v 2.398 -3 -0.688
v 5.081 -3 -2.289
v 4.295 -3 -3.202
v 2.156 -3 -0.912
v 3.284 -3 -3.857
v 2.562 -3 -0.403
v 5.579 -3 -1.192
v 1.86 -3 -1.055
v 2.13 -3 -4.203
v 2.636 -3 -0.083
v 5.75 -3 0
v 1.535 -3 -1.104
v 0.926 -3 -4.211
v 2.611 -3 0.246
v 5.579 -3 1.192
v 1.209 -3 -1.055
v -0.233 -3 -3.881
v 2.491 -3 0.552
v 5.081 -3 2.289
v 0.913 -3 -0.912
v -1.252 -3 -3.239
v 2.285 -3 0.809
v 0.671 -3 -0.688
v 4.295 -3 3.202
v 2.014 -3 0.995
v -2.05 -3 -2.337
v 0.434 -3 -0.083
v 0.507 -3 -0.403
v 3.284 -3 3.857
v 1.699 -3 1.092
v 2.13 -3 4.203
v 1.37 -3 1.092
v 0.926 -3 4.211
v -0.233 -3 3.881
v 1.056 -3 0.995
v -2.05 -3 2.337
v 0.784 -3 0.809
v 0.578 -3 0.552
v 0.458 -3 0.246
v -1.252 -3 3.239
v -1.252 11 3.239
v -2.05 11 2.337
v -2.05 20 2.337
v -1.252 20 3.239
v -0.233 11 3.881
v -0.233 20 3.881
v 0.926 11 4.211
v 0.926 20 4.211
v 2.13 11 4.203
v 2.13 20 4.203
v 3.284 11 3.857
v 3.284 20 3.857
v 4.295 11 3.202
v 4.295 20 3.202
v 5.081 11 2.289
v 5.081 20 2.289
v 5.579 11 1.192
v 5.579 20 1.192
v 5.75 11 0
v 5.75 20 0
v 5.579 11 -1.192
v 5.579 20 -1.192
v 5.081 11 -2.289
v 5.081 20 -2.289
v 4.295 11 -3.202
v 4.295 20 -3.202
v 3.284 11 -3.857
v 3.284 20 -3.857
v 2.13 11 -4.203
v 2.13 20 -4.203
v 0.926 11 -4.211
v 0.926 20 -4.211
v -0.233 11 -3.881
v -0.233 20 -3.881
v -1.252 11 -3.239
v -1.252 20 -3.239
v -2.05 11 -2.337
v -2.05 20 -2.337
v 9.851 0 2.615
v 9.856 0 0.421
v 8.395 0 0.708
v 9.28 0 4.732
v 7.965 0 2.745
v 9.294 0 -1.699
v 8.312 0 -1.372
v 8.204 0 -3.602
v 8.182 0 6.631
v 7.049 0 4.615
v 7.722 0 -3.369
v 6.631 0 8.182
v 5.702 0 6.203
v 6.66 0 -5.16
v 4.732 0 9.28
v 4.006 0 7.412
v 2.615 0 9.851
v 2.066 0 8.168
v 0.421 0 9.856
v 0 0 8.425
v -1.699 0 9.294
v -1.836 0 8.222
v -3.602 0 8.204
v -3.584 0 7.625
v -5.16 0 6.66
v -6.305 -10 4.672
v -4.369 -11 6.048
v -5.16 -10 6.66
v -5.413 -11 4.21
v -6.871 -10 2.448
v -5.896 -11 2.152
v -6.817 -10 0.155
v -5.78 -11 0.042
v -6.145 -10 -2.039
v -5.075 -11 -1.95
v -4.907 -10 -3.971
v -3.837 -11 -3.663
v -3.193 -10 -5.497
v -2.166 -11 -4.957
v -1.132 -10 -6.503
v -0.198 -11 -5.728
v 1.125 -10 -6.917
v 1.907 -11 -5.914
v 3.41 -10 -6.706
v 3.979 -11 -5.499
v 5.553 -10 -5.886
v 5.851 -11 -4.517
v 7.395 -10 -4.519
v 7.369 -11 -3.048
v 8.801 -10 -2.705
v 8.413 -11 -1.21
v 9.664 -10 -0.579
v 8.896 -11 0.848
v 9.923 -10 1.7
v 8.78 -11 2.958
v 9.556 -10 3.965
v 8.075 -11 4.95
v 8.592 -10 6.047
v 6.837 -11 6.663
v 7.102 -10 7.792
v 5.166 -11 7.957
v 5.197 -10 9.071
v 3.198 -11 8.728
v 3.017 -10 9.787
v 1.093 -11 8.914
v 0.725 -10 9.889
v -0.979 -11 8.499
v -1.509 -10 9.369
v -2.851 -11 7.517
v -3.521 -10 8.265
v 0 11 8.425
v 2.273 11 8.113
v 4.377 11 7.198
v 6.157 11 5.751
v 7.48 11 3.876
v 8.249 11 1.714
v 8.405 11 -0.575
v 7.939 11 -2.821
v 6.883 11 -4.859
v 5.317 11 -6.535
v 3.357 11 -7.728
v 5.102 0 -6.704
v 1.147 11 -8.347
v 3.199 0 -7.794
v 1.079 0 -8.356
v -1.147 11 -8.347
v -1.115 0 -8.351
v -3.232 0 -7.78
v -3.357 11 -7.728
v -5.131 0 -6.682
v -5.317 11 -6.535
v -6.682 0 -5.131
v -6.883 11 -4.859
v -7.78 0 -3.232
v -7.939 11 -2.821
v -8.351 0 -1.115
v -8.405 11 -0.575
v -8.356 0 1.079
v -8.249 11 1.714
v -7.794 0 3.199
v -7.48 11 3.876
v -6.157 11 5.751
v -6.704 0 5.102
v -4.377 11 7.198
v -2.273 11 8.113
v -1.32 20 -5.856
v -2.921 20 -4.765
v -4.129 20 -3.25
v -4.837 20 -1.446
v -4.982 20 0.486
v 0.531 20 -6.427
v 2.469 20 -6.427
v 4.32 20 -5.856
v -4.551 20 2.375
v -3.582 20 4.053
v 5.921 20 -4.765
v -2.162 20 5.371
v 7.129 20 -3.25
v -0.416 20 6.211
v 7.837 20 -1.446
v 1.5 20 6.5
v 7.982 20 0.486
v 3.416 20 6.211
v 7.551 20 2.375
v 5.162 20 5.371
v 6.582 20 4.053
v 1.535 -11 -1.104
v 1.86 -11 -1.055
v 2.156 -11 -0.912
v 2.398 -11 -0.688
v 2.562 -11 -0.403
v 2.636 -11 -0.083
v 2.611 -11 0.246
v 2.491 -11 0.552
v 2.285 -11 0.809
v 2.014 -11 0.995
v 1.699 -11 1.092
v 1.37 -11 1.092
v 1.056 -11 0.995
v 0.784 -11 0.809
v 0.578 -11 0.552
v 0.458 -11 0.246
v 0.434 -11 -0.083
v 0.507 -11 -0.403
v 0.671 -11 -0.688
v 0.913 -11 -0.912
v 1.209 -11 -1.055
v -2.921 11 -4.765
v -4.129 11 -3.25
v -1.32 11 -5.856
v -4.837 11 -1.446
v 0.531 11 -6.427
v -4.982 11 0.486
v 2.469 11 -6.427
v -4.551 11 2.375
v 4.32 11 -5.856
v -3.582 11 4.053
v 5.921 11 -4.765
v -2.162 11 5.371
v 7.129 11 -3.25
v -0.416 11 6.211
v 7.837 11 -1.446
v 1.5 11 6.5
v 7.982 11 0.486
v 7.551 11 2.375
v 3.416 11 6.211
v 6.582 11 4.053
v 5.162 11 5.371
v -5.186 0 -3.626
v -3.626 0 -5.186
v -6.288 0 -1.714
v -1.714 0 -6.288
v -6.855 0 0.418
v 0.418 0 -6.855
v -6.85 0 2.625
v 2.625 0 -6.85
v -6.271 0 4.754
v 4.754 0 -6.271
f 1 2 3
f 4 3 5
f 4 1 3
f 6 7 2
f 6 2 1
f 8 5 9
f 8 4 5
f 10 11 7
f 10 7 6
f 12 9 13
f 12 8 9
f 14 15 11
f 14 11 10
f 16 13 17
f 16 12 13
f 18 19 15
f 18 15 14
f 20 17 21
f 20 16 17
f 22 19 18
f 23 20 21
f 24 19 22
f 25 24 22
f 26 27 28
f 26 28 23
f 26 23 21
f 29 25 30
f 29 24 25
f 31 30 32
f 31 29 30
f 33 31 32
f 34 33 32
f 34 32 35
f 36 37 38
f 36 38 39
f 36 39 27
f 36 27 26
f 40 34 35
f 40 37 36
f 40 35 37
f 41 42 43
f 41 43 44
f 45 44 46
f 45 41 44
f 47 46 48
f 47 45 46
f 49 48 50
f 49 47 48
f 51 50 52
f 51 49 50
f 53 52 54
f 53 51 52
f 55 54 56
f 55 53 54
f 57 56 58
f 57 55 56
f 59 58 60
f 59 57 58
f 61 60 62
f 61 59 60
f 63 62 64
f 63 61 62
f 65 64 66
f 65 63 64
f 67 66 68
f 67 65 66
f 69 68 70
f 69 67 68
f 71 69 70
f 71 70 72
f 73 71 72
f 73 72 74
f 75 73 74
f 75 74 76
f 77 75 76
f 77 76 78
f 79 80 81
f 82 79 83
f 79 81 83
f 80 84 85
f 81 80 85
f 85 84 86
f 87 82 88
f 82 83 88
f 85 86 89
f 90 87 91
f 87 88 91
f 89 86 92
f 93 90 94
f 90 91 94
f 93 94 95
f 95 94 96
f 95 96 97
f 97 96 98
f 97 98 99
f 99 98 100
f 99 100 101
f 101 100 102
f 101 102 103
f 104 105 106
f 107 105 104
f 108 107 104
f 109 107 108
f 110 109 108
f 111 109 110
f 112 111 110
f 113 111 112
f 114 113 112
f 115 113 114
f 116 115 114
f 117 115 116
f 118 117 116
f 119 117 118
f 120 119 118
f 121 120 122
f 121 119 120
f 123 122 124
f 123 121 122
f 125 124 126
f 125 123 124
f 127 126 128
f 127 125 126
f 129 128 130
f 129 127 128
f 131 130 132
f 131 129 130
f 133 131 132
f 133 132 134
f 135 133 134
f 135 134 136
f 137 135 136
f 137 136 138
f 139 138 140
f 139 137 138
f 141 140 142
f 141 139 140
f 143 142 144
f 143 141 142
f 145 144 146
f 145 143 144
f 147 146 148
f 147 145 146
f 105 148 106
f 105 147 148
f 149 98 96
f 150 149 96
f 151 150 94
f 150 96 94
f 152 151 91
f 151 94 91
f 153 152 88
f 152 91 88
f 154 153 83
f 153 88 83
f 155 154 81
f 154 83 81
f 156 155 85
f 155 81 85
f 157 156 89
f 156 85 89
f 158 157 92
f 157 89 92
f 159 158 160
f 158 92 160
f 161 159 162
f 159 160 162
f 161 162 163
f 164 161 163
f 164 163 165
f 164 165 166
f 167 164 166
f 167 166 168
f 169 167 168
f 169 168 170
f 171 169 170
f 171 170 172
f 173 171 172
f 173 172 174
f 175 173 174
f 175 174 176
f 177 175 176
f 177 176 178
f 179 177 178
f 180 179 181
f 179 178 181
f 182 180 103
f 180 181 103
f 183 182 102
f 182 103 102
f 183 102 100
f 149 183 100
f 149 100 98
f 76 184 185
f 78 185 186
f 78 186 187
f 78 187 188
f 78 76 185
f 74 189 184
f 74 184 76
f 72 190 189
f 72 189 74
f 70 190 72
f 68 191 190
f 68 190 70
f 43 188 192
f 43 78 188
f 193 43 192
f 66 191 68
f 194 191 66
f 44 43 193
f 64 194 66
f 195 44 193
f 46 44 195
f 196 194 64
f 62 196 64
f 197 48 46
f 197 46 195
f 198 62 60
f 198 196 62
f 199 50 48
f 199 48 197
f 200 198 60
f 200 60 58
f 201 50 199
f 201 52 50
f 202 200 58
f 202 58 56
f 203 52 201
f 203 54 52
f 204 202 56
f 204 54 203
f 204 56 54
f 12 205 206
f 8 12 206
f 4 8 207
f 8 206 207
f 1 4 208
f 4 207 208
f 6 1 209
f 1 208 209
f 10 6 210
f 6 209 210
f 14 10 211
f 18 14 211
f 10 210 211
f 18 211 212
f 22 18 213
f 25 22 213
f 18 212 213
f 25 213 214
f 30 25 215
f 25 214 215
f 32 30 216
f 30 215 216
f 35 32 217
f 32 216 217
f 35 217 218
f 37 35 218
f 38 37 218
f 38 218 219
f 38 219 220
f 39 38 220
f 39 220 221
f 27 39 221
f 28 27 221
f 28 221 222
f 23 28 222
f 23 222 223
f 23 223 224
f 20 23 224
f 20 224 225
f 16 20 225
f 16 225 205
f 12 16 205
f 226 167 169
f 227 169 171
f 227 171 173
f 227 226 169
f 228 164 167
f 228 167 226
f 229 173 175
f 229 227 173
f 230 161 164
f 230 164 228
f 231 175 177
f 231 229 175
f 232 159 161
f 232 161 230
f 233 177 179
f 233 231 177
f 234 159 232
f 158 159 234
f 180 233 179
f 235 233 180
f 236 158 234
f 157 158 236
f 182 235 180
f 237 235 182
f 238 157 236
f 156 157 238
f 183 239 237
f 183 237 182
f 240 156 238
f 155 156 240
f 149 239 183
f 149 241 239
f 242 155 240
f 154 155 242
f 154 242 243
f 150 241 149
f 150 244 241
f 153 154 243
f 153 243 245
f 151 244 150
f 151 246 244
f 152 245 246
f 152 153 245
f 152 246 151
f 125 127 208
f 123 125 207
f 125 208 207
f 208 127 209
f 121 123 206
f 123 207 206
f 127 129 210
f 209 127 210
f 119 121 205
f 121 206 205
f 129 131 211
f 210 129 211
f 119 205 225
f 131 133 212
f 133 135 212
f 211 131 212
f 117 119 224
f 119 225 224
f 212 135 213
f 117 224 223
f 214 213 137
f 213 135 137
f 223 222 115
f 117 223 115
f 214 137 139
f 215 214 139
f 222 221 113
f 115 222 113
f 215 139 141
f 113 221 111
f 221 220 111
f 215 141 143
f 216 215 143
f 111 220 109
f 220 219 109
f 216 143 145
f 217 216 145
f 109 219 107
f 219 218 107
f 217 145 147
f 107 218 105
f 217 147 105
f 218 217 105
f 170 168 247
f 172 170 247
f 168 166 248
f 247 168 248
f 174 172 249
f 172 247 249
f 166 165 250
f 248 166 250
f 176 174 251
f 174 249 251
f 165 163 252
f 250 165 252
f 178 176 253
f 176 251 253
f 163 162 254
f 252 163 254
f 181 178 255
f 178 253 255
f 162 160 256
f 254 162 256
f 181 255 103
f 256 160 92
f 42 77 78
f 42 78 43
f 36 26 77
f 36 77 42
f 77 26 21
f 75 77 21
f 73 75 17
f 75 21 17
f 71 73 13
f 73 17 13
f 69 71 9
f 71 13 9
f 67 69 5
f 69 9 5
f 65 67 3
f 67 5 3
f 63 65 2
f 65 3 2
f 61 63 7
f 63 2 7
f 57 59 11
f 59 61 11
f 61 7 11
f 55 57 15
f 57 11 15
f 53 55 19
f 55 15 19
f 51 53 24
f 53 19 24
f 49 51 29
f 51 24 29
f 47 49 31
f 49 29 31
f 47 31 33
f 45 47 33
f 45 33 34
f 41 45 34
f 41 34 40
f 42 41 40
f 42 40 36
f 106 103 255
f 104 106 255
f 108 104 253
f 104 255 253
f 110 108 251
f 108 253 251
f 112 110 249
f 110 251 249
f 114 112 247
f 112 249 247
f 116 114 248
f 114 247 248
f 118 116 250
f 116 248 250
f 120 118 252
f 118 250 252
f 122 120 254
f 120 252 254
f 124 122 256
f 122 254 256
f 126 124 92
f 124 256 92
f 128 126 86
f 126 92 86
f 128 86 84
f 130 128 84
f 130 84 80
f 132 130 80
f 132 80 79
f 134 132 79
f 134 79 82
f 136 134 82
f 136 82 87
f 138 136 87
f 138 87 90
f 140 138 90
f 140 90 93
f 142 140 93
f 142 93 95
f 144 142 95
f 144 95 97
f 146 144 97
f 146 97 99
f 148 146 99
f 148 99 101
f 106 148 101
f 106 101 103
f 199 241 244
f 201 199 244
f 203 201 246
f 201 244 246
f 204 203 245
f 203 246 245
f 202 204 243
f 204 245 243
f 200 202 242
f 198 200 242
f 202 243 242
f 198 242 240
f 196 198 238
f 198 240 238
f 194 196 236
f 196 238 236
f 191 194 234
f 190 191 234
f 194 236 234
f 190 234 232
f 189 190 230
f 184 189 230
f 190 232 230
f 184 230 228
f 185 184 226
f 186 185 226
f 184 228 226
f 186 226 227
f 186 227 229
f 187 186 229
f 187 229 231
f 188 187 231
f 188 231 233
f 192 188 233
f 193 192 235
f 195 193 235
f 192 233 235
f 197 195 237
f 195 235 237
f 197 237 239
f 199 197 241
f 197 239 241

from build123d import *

# Parameters (mm, degrees)
SKETCH1_R           = 8.425
BOSS_EXTRUDE1_DEPTH = 11
SKETCH3_R           = 8.425
BOSS_EXTRUDE2_DEPTH = 11
SKETCH4_R           = 4.25
CUT_EXTRUDE1_DEPTH  = 27.096192251
BOSS_EXTRUDE3_DEPTH = 22
CHAMFER1_SIZE       = 1
SKETCH6_R           = 6.5
BOSS_EXTRUDE4_DEPTH = 9
BOSS_EXTRUDE5_DEPTH = 8
SKETCH10_R          = 1.104065367
CUT_EXTRUDE2_DEPTH  = 35.029564352


with BuildPart() as part:
    # Sketch1 → Boss-Extrude1 (new body)
    with BuildSketch(Plane(origin=(0, 0, 0), x_dir=(1, 0, 0), z_dir=(0, 1, 0))):
        with Locations(Location((0, 0, 0), (0, 0, 270))):
            Circle(SKETCH1_R)
    extrude(amount=BOSS_EXTRUDE1_DEPTH)

    # Sketch3 → Boss-Extrude2 (add)
    with BuildSketch(Plane.XZ):
        with Locations(Location((1.5, 1.5, 0), (0, 0, 142.232408159))):
            Circle(SKETCH3_R)
    extrude(amount=BOSS_EXTRUDE2_DEPTH)

    # Sketch4 → Cut-Extrude1 (cut, through all)
    with BuildSketch(Plane.XZ.offset(11)):
        with Locations(Location((1.5, 0, 0), (0, 0, 270))):
            Circle(SKETCH4_R)
    extrude(amount=-CUT_EXTRUDE1_DEPTH, mode=Mode.SUBTRACT)

    # Sketch5 → Boss-Extrude3 (add)
    with BuildSketch(Plane.XZ.offset(11)):
        with BuildLine():
            Line((-2.05, 2.336664289), (-2.05, -2.336664289))
            ThreePointArc((-2.05, -2.336664289), (-2.75, 0), (-2.05, 2.336664289))
        make_face()
    extrude(amount=-BOSS_EXTRUDE3_DEPTH)

    # Chamfer1
    chamfer1_edges = [part.edges().sort_by_distance(p)[0] for p in [
        (8.159975677, -11, -3.659975677),
    ]]
    chamfer(chamfer1_edges, length=CHAMFER1_SIZE)

    # Sketch6 → Boss-Extrude4 (add)
    with BuildSketch(Plane(origin=(0, 11, 0), x_dir=(1, 0, 0), z_dir=(0, 1, 0))):
        with Locations(Location((1.5, 0, 0), (0, 0, 270))):
            Circle(SKETCH6_R)
        with BuildLine():
            Line((-2.05, 2.336664289), (-2.05, -2.336664289))
            ThreePointArc((-2.05, -2.336664289), (5.75, 0), (-2.05, 2.336664289))
        make_face(mode=Mode.SUBTRACT)
    extrude(amount=BOSS_EXTRUDE4_DEPTH)

    # Sketch7 → Boss-Extrude5 (add)
    with BuildSketch(Plane.XZ.offset(11)):
        with BuildLine():
            Line((-2.05, -2.336664289), (-2.05, 2.336664289))
            ThreePointArc((-2.05, 2.336664289), (5.75, 0), (-2.05, -2.336664289))
        make_face()
    extrude(amount=-BOSS_EXTRUDE5_DEPTH)

    # Sketch10 → Cut-Extrude2 (cut, through all)
    with BuildSketch(Plane.XZ.offset(11)):
        with Locations(Location((1.534537663, 0, 0), (0, 0, 270))):
            Circle(SKETCH10_R)
    extrude(amount=-CUT_EXTRUDE2_DEPTH, mode=Mode.SUBTRACT)


solid = part.part
